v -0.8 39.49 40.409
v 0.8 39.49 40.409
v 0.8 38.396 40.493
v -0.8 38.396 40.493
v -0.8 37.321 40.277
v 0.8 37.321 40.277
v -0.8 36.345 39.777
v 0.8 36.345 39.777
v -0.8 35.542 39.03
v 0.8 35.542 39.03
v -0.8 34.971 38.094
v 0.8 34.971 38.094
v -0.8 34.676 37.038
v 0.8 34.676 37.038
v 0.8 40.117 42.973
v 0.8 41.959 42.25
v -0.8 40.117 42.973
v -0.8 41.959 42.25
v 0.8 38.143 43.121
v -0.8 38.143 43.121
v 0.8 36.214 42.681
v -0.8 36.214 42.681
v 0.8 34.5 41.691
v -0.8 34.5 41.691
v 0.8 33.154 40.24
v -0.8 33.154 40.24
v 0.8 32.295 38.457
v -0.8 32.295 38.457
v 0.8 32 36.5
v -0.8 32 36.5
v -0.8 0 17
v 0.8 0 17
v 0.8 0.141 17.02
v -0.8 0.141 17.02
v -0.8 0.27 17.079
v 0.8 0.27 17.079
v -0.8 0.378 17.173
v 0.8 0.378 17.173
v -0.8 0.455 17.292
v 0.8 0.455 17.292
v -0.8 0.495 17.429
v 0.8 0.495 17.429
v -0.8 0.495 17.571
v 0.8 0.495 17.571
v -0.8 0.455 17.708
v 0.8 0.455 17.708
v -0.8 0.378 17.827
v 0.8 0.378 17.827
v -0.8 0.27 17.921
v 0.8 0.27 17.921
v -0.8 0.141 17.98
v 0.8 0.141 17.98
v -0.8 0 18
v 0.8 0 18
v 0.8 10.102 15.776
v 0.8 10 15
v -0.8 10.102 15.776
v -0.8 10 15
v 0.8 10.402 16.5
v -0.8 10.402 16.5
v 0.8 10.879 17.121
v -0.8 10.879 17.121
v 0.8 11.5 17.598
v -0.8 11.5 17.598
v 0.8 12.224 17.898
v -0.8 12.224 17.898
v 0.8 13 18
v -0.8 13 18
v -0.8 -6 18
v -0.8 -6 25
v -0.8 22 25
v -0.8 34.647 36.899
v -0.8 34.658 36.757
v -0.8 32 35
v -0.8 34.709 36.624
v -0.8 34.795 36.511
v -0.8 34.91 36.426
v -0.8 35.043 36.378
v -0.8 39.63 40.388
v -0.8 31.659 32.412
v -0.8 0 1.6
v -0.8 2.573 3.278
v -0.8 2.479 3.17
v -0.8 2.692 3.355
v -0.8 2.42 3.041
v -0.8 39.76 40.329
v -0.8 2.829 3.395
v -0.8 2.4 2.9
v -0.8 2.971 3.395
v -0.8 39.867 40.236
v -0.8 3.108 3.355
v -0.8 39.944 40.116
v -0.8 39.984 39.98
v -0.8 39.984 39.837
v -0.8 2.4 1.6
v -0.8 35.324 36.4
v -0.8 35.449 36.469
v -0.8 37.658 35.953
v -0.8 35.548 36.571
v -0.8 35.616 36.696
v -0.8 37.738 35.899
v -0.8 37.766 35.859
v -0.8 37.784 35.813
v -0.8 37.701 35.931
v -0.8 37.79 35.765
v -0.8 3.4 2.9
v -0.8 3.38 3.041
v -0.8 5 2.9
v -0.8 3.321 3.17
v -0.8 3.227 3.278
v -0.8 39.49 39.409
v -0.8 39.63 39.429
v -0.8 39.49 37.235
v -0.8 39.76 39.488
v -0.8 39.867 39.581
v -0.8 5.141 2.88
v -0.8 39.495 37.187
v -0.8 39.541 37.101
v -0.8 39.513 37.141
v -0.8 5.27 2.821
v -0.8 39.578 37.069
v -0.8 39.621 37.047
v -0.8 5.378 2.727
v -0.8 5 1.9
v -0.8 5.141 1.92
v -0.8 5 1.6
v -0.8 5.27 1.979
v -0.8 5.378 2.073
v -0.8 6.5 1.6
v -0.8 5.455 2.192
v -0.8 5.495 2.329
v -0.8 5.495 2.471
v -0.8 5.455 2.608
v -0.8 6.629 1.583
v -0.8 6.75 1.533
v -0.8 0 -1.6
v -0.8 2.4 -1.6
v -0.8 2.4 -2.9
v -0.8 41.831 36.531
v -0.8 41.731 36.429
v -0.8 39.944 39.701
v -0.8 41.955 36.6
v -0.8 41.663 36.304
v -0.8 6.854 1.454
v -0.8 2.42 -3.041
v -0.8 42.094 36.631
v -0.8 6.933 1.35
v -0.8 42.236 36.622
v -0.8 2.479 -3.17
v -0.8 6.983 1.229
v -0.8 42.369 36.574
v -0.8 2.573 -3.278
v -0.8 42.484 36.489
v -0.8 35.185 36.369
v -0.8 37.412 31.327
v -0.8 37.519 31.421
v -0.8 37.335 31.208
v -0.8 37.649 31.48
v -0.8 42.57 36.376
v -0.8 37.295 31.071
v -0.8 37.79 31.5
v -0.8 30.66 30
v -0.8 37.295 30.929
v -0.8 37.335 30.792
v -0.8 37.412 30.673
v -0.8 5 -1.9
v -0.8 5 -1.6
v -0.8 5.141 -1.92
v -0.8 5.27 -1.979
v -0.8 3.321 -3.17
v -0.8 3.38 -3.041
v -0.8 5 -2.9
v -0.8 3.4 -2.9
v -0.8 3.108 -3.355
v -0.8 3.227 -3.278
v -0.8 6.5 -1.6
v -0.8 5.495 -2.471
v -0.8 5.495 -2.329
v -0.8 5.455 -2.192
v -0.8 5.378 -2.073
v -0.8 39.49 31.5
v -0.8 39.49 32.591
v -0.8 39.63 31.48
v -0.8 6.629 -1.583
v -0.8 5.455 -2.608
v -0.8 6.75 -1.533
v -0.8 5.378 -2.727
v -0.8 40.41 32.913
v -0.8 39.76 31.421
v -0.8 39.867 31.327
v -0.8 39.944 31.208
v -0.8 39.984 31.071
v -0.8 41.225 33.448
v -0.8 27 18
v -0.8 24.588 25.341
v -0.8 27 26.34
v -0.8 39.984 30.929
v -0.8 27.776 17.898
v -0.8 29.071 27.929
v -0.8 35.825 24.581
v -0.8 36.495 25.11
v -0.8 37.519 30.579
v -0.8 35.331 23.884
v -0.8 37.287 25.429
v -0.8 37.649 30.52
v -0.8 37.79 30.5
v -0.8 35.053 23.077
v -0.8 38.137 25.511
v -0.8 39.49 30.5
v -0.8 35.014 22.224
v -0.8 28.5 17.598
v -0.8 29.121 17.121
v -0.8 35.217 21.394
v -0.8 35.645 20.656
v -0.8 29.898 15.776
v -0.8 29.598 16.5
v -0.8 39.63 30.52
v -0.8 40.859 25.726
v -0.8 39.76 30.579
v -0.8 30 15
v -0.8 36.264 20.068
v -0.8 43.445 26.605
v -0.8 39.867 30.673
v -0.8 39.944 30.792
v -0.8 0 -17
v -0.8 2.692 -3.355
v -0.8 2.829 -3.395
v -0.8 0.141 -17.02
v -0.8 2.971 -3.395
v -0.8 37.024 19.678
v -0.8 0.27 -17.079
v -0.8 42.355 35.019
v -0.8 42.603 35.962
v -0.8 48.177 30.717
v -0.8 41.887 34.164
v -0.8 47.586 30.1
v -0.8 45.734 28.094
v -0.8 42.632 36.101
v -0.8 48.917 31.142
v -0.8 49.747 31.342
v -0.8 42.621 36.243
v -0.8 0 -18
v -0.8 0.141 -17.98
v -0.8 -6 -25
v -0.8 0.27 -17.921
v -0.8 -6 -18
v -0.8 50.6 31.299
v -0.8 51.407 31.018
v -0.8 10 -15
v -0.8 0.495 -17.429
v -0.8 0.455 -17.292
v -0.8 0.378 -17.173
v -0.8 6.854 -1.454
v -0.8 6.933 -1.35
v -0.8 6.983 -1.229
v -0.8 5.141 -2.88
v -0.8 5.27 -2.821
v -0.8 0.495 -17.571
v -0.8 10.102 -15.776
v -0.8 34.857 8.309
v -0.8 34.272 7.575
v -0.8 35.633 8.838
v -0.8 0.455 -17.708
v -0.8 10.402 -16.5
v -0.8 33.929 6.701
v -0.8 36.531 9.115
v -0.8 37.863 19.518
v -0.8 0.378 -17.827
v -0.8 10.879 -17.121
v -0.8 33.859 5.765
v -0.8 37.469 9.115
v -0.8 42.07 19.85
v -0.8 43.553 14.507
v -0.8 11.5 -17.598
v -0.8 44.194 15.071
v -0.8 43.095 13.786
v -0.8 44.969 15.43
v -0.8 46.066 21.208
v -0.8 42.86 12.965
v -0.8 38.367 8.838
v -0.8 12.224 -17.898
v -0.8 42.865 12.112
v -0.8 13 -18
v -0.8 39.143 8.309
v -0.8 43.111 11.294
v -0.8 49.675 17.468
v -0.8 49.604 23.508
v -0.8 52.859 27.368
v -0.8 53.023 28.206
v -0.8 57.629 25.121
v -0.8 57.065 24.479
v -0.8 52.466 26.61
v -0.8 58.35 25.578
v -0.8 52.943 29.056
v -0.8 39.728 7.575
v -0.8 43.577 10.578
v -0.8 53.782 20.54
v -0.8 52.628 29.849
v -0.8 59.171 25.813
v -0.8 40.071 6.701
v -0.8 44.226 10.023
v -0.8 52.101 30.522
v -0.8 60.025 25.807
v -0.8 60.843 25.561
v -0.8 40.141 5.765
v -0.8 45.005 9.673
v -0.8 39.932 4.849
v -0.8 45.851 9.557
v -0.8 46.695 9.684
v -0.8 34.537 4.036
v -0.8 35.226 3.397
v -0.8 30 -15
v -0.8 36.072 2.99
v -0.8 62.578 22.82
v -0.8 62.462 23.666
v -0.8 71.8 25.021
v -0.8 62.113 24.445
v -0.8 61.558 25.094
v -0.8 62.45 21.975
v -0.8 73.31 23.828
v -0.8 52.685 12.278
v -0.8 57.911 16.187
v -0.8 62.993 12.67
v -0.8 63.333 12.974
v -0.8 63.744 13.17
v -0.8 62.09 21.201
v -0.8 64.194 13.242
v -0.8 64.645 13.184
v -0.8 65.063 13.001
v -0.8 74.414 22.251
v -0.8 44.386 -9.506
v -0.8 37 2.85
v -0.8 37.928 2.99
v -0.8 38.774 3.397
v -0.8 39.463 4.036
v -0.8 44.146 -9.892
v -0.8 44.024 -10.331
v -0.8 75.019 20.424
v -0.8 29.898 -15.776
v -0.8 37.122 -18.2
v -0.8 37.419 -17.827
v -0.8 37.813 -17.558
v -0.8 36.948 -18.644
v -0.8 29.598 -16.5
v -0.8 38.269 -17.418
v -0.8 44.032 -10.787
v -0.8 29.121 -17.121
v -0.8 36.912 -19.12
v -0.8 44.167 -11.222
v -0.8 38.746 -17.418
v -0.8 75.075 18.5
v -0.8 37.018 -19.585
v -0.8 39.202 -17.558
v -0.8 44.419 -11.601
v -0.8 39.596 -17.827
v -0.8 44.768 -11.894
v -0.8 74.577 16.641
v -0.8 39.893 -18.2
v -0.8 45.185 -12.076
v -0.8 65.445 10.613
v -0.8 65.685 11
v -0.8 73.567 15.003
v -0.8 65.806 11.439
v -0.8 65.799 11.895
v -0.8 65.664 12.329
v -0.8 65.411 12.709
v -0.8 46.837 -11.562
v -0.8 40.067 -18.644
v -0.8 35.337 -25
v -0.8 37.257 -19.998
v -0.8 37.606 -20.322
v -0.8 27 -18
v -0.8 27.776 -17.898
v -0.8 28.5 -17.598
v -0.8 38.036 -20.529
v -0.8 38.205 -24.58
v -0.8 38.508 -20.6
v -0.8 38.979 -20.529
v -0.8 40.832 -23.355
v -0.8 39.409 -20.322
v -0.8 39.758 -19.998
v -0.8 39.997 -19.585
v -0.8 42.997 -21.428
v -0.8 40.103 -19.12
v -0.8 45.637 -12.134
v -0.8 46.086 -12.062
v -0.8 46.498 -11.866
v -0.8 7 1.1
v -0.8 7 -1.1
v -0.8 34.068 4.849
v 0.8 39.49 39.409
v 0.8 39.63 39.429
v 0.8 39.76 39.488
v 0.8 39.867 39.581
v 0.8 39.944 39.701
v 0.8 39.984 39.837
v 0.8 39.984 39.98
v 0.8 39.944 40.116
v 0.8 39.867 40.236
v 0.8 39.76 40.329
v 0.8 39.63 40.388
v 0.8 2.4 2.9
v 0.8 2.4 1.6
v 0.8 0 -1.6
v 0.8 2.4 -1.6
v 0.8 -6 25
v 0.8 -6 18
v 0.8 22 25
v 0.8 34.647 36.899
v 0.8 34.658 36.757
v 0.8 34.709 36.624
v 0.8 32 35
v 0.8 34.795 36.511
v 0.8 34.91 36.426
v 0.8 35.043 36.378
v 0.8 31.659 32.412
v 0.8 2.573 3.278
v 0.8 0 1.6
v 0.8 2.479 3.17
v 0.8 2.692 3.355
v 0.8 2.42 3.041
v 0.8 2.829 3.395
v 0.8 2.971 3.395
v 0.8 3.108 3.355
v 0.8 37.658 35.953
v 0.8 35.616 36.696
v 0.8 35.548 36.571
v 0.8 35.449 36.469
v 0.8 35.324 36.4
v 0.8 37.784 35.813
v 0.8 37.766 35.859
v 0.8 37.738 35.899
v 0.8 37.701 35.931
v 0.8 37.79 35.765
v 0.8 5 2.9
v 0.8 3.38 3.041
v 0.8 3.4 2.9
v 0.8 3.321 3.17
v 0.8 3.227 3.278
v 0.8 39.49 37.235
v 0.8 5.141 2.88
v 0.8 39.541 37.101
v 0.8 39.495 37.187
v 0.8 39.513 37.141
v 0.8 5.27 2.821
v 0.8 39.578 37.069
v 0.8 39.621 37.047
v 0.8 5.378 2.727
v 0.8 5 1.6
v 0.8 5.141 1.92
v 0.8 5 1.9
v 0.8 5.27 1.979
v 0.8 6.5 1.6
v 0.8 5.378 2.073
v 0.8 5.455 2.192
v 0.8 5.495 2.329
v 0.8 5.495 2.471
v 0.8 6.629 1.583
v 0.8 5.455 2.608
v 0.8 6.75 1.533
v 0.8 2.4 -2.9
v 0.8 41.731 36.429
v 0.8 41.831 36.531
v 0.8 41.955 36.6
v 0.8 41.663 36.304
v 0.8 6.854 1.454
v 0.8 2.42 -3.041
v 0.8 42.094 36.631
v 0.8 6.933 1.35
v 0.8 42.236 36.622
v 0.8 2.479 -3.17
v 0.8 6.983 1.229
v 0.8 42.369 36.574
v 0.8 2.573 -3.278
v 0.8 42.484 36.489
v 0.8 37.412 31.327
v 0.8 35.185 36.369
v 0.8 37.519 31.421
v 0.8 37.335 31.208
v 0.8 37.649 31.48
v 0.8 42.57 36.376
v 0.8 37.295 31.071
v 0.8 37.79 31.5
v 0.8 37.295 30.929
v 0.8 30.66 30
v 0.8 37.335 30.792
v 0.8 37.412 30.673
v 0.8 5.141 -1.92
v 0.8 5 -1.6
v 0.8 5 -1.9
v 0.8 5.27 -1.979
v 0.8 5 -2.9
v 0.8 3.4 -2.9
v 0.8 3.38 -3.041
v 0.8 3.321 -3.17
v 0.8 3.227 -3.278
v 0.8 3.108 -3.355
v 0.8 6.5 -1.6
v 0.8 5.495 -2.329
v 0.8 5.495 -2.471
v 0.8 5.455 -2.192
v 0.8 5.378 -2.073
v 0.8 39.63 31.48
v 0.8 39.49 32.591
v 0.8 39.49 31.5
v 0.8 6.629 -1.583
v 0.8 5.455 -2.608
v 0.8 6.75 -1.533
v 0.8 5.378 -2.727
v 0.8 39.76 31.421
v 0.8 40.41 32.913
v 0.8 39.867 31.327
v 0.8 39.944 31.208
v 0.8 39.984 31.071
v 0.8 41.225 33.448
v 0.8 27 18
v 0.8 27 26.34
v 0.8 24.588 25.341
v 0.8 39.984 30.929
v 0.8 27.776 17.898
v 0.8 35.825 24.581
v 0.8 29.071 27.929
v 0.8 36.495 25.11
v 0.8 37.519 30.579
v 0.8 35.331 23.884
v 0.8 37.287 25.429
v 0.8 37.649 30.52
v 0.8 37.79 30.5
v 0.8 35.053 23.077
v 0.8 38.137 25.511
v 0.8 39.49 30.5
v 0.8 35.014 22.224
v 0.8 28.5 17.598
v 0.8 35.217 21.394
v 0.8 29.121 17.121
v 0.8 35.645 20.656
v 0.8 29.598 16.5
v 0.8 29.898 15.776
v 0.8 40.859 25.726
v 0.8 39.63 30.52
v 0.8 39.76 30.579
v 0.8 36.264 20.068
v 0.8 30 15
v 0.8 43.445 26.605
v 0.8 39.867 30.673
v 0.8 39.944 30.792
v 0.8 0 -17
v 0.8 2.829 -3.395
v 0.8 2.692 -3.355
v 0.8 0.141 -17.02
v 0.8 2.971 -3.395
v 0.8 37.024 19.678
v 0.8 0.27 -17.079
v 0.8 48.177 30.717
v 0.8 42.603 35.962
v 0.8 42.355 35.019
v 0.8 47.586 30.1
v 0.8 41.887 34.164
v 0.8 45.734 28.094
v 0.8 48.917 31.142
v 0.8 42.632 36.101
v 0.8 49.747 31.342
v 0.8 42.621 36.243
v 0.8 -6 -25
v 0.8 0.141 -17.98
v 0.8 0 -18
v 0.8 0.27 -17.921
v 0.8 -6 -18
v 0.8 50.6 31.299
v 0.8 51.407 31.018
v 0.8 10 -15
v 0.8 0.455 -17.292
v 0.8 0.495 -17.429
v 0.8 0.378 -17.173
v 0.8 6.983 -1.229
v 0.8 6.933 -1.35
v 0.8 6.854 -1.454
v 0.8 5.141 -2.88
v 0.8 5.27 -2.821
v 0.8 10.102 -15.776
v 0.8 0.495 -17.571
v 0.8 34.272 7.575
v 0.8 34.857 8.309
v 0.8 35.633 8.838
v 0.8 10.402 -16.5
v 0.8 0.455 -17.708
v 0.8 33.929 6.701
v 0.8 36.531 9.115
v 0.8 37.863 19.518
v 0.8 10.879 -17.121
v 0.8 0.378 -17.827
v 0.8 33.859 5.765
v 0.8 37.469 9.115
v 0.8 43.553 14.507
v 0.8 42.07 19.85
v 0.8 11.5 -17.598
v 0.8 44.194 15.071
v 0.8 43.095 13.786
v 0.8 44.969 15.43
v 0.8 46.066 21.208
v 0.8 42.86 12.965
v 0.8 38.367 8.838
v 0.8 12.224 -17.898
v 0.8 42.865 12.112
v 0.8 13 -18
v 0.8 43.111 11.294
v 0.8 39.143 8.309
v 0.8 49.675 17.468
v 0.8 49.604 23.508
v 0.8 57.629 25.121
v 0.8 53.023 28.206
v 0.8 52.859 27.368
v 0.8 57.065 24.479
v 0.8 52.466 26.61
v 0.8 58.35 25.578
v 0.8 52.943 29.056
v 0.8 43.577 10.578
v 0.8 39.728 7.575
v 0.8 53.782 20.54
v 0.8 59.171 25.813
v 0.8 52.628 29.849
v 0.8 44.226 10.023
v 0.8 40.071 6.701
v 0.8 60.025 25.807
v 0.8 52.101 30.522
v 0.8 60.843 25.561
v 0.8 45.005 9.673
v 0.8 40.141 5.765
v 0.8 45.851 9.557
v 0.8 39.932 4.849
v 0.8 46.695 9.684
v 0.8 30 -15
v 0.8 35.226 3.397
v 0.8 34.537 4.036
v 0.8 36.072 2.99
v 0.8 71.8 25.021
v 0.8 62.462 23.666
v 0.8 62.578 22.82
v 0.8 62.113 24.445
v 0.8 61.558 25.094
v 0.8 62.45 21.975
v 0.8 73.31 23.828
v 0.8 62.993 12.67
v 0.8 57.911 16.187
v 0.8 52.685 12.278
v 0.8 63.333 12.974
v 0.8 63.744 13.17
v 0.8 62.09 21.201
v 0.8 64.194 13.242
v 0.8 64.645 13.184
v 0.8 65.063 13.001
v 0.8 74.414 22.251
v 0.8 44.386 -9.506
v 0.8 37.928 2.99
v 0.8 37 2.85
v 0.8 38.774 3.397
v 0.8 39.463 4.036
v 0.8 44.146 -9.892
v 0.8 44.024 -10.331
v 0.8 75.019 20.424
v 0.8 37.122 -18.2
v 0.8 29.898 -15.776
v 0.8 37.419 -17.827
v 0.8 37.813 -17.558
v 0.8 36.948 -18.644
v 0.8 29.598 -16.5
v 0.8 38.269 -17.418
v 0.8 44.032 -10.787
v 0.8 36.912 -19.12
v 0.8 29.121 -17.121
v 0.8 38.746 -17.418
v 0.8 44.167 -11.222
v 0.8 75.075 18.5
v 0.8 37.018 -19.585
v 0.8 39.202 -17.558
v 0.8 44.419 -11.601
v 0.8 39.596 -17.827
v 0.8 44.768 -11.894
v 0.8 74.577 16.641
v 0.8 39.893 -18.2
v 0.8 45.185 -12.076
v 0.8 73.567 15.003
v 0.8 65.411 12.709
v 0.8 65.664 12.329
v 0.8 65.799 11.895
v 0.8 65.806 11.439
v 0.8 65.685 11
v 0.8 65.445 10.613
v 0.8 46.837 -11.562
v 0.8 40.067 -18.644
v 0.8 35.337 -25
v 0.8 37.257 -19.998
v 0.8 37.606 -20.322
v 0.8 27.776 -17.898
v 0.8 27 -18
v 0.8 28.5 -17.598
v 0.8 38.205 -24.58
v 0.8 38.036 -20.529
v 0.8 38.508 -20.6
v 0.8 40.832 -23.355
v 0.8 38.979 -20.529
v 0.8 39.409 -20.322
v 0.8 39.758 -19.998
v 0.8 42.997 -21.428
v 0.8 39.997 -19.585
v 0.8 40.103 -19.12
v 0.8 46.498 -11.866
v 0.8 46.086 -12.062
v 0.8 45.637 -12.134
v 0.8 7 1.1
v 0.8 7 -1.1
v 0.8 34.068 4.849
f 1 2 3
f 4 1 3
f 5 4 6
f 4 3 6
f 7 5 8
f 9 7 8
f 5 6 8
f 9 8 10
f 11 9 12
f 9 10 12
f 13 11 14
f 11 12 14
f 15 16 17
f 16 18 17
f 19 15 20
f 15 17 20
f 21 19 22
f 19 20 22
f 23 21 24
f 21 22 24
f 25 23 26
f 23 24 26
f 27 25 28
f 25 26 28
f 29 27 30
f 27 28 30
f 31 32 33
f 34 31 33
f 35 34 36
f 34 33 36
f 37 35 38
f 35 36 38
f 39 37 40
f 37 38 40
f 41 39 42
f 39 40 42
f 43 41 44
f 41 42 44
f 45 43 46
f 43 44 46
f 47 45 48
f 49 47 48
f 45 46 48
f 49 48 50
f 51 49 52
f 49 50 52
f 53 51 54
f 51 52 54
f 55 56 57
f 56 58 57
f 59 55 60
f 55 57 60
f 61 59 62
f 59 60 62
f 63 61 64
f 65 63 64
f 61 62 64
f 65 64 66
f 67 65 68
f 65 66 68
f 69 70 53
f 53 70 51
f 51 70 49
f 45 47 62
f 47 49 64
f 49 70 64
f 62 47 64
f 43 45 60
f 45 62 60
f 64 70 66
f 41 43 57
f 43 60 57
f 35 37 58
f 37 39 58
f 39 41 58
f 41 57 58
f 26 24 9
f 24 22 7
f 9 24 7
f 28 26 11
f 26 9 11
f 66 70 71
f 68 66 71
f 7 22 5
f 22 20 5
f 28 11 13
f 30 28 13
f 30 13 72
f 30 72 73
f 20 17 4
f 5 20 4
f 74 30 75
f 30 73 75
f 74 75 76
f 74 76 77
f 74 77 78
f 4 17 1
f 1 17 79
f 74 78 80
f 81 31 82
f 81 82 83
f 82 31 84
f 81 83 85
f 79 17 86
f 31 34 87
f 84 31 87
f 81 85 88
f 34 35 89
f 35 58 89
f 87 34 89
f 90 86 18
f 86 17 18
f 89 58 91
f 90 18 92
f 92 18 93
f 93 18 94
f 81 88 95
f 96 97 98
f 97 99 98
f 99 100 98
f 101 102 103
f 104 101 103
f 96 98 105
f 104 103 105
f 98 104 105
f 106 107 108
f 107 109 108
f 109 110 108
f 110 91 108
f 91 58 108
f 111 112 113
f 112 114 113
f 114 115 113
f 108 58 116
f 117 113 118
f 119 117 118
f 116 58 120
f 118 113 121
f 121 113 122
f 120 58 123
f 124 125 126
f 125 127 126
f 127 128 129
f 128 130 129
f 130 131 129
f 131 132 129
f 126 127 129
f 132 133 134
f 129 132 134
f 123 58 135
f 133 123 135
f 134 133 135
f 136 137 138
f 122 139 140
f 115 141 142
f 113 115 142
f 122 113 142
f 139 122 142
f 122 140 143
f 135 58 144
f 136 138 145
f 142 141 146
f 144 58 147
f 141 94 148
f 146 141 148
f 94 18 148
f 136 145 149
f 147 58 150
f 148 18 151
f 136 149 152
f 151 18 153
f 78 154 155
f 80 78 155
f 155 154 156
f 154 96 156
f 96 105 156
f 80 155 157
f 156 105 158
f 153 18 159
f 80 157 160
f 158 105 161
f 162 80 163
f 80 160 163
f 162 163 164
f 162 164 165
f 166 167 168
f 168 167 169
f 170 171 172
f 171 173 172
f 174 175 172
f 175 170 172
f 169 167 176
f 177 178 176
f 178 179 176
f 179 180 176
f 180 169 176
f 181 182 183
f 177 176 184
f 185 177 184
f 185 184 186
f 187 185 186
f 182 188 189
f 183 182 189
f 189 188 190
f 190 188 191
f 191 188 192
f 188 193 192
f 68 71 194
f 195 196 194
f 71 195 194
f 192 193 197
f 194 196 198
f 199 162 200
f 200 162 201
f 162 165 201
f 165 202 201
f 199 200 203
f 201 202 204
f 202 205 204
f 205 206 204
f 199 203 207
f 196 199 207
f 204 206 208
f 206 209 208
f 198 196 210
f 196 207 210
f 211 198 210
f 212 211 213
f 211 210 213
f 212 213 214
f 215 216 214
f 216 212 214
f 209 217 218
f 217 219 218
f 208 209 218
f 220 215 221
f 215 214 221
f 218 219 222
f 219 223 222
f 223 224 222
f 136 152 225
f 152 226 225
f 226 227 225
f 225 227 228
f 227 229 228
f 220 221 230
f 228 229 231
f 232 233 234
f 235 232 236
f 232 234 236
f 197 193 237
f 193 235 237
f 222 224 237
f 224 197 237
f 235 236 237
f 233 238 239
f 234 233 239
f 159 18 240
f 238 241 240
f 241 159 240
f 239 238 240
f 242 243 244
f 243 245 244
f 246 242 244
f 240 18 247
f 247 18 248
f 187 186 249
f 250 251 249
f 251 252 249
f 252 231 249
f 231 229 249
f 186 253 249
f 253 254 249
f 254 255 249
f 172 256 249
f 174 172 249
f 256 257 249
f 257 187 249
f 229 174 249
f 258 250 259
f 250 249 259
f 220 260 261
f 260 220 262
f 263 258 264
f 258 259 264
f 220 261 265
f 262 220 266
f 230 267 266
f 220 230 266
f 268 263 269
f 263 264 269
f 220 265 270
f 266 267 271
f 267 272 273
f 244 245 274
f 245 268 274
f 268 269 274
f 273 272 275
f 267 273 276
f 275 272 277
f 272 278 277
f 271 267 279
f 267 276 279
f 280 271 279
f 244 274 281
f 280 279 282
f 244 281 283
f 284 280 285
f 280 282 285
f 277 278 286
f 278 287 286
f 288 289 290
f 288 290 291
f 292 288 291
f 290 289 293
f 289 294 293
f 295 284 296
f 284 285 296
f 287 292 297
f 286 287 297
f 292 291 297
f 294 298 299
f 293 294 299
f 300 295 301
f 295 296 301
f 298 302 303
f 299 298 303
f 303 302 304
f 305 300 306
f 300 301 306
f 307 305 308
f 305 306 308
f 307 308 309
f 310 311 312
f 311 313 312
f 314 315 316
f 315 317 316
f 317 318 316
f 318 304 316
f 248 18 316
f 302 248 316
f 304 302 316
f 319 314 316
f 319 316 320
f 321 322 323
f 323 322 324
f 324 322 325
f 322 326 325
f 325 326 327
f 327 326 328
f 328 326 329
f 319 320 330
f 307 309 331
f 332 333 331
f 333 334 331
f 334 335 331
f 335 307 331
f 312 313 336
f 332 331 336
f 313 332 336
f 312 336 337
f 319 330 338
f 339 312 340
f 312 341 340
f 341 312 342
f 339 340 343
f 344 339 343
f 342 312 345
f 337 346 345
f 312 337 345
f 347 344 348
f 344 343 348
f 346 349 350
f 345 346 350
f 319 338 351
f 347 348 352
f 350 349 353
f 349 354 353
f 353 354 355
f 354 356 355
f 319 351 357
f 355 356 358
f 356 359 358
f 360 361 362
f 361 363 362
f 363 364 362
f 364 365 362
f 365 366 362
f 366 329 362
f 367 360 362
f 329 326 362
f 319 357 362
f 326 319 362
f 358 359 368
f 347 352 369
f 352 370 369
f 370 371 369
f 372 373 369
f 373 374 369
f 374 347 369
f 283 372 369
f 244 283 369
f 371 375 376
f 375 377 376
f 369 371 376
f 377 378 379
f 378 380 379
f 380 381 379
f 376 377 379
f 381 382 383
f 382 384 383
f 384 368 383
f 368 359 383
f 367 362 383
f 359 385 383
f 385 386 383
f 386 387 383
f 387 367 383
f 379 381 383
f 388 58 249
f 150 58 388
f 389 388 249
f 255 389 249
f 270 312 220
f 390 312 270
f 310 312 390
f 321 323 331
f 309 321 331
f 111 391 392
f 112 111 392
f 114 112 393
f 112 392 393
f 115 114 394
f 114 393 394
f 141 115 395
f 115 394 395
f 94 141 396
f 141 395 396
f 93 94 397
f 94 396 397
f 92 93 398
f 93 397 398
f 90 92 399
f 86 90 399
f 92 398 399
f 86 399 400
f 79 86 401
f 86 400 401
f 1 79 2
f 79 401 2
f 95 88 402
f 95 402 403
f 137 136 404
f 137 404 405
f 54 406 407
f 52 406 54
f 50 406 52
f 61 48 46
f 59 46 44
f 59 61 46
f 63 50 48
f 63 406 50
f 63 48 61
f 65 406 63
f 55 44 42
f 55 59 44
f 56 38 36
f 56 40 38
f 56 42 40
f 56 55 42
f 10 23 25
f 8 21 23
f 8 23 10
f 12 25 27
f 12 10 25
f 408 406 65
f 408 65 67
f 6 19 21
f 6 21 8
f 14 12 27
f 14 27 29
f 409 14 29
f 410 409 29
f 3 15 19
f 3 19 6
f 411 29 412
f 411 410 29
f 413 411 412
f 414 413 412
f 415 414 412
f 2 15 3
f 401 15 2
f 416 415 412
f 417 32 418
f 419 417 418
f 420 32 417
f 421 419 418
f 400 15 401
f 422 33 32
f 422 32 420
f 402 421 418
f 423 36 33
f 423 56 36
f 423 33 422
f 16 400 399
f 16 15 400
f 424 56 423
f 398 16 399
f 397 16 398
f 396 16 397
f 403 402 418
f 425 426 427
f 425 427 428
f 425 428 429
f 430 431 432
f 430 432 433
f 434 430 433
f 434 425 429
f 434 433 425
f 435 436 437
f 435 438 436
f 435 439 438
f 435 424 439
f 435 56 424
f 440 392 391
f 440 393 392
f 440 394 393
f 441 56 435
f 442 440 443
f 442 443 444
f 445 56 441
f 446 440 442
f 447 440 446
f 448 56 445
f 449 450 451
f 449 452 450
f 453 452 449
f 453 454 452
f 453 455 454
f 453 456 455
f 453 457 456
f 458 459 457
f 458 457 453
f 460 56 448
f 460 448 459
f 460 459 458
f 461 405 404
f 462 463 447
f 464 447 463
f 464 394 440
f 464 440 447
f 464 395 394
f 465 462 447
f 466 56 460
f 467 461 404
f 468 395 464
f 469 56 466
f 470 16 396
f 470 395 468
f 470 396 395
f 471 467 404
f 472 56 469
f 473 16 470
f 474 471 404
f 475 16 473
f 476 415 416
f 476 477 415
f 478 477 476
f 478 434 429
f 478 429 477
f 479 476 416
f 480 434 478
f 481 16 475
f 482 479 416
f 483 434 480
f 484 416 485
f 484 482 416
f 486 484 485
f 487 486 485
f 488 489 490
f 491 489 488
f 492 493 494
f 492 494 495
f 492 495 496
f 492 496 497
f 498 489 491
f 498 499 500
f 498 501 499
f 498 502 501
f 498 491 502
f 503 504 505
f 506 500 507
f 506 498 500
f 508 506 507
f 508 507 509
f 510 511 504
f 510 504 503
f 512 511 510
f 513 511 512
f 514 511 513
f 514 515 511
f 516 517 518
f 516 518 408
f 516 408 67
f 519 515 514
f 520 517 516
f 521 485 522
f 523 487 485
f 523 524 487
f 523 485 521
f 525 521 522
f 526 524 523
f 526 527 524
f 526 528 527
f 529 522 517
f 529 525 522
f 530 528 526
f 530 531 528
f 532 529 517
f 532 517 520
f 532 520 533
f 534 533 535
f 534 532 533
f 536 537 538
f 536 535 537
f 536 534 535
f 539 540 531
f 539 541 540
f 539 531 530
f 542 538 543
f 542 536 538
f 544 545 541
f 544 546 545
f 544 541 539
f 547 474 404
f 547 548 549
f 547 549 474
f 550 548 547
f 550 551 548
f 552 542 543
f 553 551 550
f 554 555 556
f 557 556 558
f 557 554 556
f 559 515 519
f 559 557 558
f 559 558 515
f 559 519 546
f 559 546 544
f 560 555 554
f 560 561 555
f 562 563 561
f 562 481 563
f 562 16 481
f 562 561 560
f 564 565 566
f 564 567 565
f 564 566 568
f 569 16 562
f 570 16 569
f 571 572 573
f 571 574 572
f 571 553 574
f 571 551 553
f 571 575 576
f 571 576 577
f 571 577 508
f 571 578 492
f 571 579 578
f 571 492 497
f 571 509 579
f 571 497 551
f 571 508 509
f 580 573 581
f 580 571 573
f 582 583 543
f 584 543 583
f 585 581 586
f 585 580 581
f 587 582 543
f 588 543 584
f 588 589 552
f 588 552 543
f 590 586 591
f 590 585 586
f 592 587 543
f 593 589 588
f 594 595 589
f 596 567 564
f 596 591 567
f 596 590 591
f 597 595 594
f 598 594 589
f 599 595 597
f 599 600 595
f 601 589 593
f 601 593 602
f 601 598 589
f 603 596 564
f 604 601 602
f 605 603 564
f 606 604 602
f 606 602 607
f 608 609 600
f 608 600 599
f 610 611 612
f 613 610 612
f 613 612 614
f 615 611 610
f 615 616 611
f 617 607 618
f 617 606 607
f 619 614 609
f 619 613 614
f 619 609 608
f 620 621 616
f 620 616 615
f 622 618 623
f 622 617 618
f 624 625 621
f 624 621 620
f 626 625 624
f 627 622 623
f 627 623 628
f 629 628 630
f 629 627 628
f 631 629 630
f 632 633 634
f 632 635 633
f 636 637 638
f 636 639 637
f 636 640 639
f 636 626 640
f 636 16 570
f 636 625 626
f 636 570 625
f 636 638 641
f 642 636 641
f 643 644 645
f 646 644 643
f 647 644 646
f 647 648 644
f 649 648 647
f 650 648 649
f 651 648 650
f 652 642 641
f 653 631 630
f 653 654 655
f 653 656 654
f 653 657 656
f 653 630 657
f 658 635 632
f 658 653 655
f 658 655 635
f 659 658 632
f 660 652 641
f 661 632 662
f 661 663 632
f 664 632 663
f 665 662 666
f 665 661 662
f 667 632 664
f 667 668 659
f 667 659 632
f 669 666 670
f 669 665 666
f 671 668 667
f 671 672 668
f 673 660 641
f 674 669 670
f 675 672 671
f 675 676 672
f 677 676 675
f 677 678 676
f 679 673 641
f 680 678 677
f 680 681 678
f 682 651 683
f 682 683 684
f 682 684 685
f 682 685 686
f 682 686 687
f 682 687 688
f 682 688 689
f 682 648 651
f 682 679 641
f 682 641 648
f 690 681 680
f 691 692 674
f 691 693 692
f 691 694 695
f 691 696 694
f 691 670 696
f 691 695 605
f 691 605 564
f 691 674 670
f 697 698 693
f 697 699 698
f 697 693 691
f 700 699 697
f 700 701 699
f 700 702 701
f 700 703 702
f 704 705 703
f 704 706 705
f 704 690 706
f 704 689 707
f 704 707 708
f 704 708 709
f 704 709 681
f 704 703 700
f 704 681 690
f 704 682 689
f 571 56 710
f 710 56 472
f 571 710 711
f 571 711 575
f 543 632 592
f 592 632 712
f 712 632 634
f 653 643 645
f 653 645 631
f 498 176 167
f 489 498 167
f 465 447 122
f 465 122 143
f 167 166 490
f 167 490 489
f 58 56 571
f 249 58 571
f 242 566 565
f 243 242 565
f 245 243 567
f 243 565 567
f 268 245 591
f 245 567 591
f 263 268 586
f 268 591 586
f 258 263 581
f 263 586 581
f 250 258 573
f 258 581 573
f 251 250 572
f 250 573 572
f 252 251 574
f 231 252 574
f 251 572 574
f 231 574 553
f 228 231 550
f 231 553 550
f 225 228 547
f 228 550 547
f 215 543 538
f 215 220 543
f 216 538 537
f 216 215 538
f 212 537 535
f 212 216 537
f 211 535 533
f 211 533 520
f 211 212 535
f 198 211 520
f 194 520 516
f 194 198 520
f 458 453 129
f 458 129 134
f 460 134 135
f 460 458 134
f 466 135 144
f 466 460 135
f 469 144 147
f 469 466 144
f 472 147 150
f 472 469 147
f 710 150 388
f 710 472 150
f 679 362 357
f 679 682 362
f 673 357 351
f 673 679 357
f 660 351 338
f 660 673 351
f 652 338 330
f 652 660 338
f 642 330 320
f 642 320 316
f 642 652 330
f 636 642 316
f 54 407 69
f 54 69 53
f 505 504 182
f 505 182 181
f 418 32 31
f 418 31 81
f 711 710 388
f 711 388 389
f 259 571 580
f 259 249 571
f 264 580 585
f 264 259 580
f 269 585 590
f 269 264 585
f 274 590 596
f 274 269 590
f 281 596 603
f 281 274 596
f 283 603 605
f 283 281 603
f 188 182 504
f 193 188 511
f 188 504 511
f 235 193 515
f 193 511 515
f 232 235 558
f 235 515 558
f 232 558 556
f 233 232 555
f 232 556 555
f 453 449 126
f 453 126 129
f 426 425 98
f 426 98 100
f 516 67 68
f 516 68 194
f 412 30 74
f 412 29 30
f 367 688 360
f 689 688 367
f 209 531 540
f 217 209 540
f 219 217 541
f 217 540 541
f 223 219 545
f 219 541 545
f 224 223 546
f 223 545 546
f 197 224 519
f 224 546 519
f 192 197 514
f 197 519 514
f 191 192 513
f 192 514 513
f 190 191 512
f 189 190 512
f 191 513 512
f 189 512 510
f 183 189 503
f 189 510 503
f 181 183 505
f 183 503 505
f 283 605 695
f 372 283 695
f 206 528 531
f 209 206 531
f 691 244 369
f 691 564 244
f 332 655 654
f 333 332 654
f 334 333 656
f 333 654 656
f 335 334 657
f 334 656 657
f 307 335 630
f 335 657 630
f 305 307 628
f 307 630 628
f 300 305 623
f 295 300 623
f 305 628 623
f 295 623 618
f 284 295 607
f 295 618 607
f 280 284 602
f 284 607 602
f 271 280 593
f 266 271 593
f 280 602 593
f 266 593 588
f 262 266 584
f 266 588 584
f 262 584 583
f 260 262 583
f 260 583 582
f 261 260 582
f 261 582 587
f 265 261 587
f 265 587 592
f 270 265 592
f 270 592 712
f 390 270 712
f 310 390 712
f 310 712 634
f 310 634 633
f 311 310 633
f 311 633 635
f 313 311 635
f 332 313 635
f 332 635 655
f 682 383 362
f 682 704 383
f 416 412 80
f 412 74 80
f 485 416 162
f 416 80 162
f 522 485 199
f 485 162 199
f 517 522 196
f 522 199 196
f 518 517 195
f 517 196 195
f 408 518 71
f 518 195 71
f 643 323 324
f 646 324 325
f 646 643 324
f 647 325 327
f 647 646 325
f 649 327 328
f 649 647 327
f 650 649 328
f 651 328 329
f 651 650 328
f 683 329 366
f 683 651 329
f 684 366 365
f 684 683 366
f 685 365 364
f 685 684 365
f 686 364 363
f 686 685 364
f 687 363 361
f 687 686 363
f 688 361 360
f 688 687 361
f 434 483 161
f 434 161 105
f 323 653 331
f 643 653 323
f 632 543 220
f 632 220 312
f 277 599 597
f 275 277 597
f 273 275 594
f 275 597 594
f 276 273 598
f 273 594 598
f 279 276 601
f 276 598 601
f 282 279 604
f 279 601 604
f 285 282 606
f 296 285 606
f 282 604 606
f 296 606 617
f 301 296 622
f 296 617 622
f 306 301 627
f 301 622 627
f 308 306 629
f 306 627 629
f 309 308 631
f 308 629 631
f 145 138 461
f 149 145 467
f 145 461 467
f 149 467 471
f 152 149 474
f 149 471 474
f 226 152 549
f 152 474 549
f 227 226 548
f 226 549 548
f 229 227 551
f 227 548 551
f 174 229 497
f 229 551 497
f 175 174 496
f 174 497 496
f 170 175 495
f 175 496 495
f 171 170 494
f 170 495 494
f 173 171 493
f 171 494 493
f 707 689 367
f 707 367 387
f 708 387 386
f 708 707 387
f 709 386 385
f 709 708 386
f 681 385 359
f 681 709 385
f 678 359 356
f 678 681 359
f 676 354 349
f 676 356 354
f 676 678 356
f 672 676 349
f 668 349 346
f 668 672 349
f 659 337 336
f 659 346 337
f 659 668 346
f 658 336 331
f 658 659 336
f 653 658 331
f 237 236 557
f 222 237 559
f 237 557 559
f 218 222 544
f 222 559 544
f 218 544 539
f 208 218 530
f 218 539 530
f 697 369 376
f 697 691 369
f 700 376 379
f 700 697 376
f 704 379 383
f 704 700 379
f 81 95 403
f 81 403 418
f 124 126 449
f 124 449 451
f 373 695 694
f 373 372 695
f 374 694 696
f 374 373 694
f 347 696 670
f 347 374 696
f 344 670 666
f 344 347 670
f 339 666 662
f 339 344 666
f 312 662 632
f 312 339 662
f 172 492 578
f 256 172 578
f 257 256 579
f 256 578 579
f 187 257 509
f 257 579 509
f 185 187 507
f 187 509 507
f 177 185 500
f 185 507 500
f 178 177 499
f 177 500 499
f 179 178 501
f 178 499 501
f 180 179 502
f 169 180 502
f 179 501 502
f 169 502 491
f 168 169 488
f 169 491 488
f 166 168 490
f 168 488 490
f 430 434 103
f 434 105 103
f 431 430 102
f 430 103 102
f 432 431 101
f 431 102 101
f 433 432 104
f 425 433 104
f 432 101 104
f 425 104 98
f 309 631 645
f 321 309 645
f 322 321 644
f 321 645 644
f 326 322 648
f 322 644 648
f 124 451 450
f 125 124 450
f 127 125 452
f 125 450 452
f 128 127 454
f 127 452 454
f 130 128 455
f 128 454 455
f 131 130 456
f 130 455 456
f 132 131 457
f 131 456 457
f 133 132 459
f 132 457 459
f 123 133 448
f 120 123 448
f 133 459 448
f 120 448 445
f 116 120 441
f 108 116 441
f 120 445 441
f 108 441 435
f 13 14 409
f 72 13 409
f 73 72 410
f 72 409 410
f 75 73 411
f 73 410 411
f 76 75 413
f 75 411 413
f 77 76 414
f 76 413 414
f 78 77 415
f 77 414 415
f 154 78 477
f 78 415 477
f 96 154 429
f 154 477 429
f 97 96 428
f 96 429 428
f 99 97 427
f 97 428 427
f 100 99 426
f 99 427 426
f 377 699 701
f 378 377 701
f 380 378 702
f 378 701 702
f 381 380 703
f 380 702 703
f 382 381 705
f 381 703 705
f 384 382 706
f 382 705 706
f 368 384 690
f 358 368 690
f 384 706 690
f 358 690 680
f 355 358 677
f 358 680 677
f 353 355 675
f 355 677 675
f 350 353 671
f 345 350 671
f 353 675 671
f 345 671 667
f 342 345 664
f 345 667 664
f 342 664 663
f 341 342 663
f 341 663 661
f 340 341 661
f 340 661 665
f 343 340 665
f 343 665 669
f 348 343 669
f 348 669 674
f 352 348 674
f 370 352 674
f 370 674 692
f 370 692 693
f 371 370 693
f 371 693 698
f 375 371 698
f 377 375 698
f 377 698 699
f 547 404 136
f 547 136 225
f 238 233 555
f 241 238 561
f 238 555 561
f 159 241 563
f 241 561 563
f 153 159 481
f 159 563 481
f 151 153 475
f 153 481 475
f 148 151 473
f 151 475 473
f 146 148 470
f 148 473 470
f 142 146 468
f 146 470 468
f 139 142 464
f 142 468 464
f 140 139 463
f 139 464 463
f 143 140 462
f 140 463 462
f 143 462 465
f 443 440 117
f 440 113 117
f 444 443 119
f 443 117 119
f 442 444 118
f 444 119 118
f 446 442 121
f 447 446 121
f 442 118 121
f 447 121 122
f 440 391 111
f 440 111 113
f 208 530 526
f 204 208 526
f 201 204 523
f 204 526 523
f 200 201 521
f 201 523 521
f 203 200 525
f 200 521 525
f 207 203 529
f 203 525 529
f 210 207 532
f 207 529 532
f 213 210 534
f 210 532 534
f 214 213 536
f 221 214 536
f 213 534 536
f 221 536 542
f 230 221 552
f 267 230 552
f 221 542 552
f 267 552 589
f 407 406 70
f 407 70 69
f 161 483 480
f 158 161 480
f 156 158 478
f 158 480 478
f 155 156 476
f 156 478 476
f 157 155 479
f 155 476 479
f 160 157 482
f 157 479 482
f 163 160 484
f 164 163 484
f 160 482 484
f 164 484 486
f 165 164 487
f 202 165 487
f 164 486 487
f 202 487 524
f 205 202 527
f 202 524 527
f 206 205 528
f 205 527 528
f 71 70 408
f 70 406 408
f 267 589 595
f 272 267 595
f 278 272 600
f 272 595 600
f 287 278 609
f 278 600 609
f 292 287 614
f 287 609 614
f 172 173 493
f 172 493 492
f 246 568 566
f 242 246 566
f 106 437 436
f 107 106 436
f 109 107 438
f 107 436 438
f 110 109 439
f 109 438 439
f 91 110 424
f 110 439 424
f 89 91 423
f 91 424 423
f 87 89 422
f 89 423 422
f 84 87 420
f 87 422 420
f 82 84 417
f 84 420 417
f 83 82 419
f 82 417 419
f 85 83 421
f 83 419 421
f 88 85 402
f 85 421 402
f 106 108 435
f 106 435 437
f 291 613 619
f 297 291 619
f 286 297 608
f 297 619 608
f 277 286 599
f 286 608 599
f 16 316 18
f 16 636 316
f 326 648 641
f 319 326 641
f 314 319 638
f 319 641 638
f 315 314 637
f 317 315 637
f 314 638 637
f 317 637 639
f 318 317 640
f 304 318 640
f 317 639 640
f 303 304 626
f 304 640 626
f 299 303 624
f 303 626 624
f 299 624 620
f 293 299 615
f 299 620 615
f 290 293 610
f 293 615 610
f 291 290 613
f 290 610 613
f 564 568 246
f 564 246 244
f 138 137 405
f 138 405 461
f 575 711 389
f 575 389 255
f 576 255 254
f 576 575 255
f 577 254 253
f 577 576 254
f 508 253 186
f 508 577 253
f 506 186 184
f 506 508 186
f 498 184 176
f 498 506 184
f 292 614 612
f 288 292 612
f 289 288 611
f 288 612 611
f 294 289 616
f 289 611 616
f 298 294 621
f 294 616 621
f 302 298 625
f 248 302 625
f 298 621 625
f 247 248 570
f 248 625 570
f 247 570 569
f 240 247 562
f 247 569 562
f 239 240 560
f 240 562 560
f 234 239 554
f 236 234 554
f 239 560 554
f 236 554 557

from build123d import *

# Parameters (mm, degrees)
MAIN_BODY_DEPTH                     = 0.8
SLOT_TABS_REACH                     = 94.146
SKETCH2_W                           = 7
SKETCH2_H                           = 6
SLOT_TABS_DIRECTION_2_REACH         = 94.146
ATTACHMENT_T_SLOT_DEPTH             = 93.146279065
ATTACHMENT_T_SLOT_DEPTH_BACK        = 93.146279065
SKETCH5_R                           = 1.6
CAMERA_SLOT_AND_STANDOFF_HOLE_DEPTH = 93.156696694
SKETCH6_R                           = 4
CAMERA_PLATE_HOLE_DEPTH             = 93.156696694
SKETCH9_W                           = 4
SKETCH9_H                           = 1.7
CAMERA_PLATE_SLOT_DEPTH             = 93.156696694
ANGLE_GUARD_DEPTH                   = 1.6
SKETCH7_W                           = 36
SKETCH7_H                           = 20
CUT_EXTRUDE4_DEPTH                  = 93.156696694
CAMERA_PLATE_HOLE_EASE_R            = 0.2
ACCESS_HOLE_FILLET_R                = 3
SECONDARY_FILLET_R                  = 10
CAMERA_EDGE_FILLET_R                = 6.639528096
SKETCH8_R                           = 3.15
TX_MOUNT_HOLE_DEPTH                 = 87.640768077
CUT_EXTRUDE5_REACH                  = 88.641
SKETCH14_R                          = 0.5
CUT_EXTRUDE6_REACH                  = 88.641


with BuildPart() as part:
    # Sketch1 → main body (new, symmetric)
    with BuildSketch(Plane(origin=(0, 0, 0), x_dir=(0, 0, -1), z_dir=(1, 0, 0))):
        Polygon((-25, 0), (25, 0), (25, 40), (-21.064869316, 78.653014853), (-48, 32), (-25, 32), align=None)
    extrude(amount=MAIN_BODY_DEPTH, both=True)

    # slot tabs: up to this face of the body (flat: up to its plane)
    slot_tabs_end = Plane(part.part.faces().sort_by_distance((0.8, 33.215216507, 6.663009482))[0])
    # Sketch2 → slot tabs (add, up to the picked face)
    with BuildSketch(Plane(origin=(0, 0, 0), x_dir=(0, 0, -1), z_dir=(1, 0, 0)), mode=Mode.PRIVATE) as slot_tabs_sk1:
        with Locations((-21.5, -3)):
            Rectangle(SKETCH2_W, SKETCH2_H)
    slot_tabs_tool1 = split(extrude(slot_tabs_sk1.sketch, amount=SLOT_TABS_REACH, mode=Mode.PRIVATE), bisect_by=slot_tabs_end, keep=Keep.BOTH, mode=Mode.PRIVATE)
    # Sketch2 → slot tabs (add, up to the picked face)
    with BuildSketch(Plane(origin=(0, 0, 0), x_dir=(0, 0, -1), z_dir=(1, 0, 0)), mode=Mode.PRIVATE) as slot_tabs_sk2:
        with Locations((21.5, -3)):
            Rectangle(SKETCH2_W, SKETCH2_H)
    slot_tabs_tool2 = split(extrude(slot_tabs_sk2.sketch, amount=SLOT_TABS_REACH, mode=Mode.PRIVATE), bisect_by=slot_tabs_end, keep=Keep.BOTH, mode=Mode.PRIVATE)
    add(slot_tabs_tool1.solids().sort_by(Axis((0, -3, 21.5), (1, 0, 0)))[0])
    add(slot_tabs_tool2.solids().sort_by(Axis((0, -3, -21.5), (1, 0, 0)))[0])

    # slot tabs direction 2: up to this face of the body (flat: up to its plane)
    slot_tabs_direction_2_end = Plane(part.part.faces().sort_by_distance((-0.8, 33.215216507, 6.663009482))[0])
    # Sketch2 → slot tabs direction 2 (add, up to the picked face)
    with BuildSketch(Plane(origin=(0, 0, 0), x_dir=(0, 0, -1), z_dir=(1, 0, 0)), mode=Mode.PRIVATE) as slot_tabs_direction_2_sk1:
        with Locations((-21.5, -3)):
            Rectangle(SKETCH2_W, SKETCH2_H)
    slot_tabs_direction_2_tool1 = split(extrude(slot_tabs_direction_2_sk1.sketch, amount=-SLOT_TABS_DIRECTION_2_REACH, mode=Mode.PRIVATE), bisect_by=slot_tabs_direction_2_end, keep=Keep.BOTH, mode=Mode.PRIVATE)
    # Sketch2 → slot tabs direction 2 (add, up to the picked face)
    with BuildSketch(Plane(origin=(0, 0, 0), x_dir=(0, 0, -1), z_dir=(1, 0, 0)), mode=Mode.PRIVATE) as slot_tabs_direction_2_sk2:
        with Locations((21.5, -3)):
            Rectangle(SKETCH2_W, SKETCH2_H)
    slot_tabs_direction_2_tool2 = split(extrude(slot_tabs_direction_2_sk2.sketch, amount=-SLOT_TABS_DIRECTION_2_REACH, mode=Mode.PRIVATE), bisect_by=slot_tabs_direction_2_end, keep=Keep.BOTH, mode=Mode.PRIVATE)
    add(slot_tabs_direction_2_tool1.solids().sort_by(Axis((0, -3, 21.5), (-1, 0, 0)))[0])
    add(slot_tabs_direction_2_tool2.solids().sort_by(Axis((0, -3, -21.5), (-1, 0, 0)))[0])

    # Sketch3 → attachment t-slot (cut, two sides: drawn at the far end of the back side and taken through both)
    with BuildSketch(Plane(origin=(0, 0, 0), x_dir=(0, 0, -1), z_dir=(1, 0, 0)).offset(-ATTACHMENT_T_SLOT_DEPTH_BACK)):
        Polygon((-1.6, 2.4), (-1.6, 0), (1.6, 0), (1.6, 2.4), (2.9, 2.4), (2.9, 5), (-2.9, 5), (-2.9, 2.4), align=None)
    extrude(amount=ATTACHMENT_T_SLOT_DEPTH + ATTACHMENT_T_SLOT_DEPTH_BACK, mode=Mode.SUBTRACT)

    # Sketch5 → camera slot and standoff hole (cut, through all)
    with BuildSketch(Plane(origin=(0.8, 0, 0), x_dir=(0, 0, -1), z_dir=(1, 0, 0))):
        with Locations((19, 38.50756134)):
            Circle(SKETCH5_R)
        with BuildLine():
            Line((-10.613317549, 65.444736837), (11.562427184, 46.83707761))
            ThreePointArc((11.562427184, 46.83707761), (11.759638118, 44.582946325), (9.505506833, 44.385735392))
            Line((9.505506833, 44.385735392), (-12.6702379, 62.993394619))
            ThreePointArc((-12.6702379, 62.993394619), (-12.867448834, 65.247525903), (-10.613317549, 65.444736837))
        make_face()
    extrude(amount=-CAMERA_SLOT_AND_STANDOFF_HOLE_DEPTH, mode=Mode.SUBTRACT)

    # Sketch6 → camera plate hole (cut, through all)
    with BuildSketch(Plane(origin=(0.8, 0, 0), x_dir=(0, 0, -1), z_dir=(1, 0, 0))):
        with Locations((-36.5, 38.639528096)):
            Circle(SKETCH6_R)
    extrude(amount=-CAMERA_PLATE_HOLE_DEPTH, mode=Mode.SUBTRACT)

    # Sketch9 → camera plate slot (cut, through all)
    with BuildSketch(Plane(origin=(0.8, 0, 0), x_dir=(0, 0, -1), z_dir=(1, 0, 0))):
        with Locations((-32.5, 38.639528096)):
            Rectangle(SKETCH9_W, SKETCH9_H)
    extrude(amount=-CAMERA_PLATE_SLOT_DEPTH, mode=Mode.SUBTRACT)

    # Sketch11 → angle guard (add)
    with BuildSketch(Plane(origin=(0.8, 0, 0), x_dir=(0, 0, -1), z_dir=(1, 0, 0))):
        with BuildLine():
            Line((-40.408644266, 39.489528096), (-37.095176407, 39.489528096))
            Line((-37.095176407, 39.489528096), (-35.961903656, 42.603169392))
            ThreePointArc((-35.961903656, 42.603169392), (-38.794305745, 41.916136273), (-40.408644266, 39.489528096))
        make_face()
        with BuildLine():
            ThreePointArc((-37.038096344, 34.6758868), (-34.205694255, 35.362919919), (-32.591355734, 37.789528096))
            Line((-32.591355734, 37.789528096), (-35.904823593, 37.789528096))
            Line((-35.904823593, 37.789528096), (-37.038096344, 34.6758868))
        make_face()
    extrude(amount=-ANGLE_GUARD_DEPTH)

    # Sketch7 → Cut-Extrude4 (cut, through all)
    with BuildSketch(Plane(origin=(0.8, 0, 0), x_dir=(0, 0, -1), z_dir=(1, 0, 0))):
        with Locations((0, 20)):
            Rectangle(SKETCH7_W, SKETCH7_H)
    extrude(amount=-CUT_EXTRUDE4_DEPTH, mode=Mode.SUBTRACT)

    # camera plate hole ease
    camera_plate_hole_ease_edges = [part.edges().sort_by_distance(p)[0] for p in [
        (0, 39.489528096, 37.095176407),
        (0, 37.789528096, 35.904823593),
    ]]
    fillet(camera_plate_hole_ease_edges, radius=CAMERA_PLATE_HOLE_EASE_R)

    # access hole fillet
    access_hole_fillet_edges = [part.edges().sort_by_distance(p)[0] for p in [
        (0, 10, 18),
        (0, 30, 18),
        (0, 30, -18),
        (0, 10, -18),
    ]]
    fillet(access_hole_fillet_edges, radius=ACCESS_HOLE_FILLET_R)

    # secondary fillet
    secondary_fillet_edges = [part.edges().sort_by_distance(p)[0] for p in [
        (0, 32, 25),
        (0, 40, -25),
    ]]
    fillet(secondary_fillet_edges, radius=SECONDARY_FILLET_R)

    # camera edge fillet
    camera_edge_fillet_edges = [part.edges().sort_by_distance(p)[0] for p in [
        (0, 32, 48),
        (0, 78.653014853, 21.064869316),
    ]]
    fillet(camera_edge_fillet_edges, radius=CAMERA_EDGE_FILLET_R)

    # Sketch8 → TX mount hole (cut, through all)
    with BuildSketch(Plane(origin=(0.8, 0, 0), x_dir=(0, 0, -1), z_dir=(1, 0, 0))):
        with Locations((-6, 37)):
            Circle(SKETCH8_R)
    extrude(amount=-TX_MOUNT_HOLE_DEPTH, mode=Mode.SUBTRACT)

    # Sketch14 → Cut-Extrude5 (cut, up to next)
    with BuildSketch(Plane(origin=(0.8, 0, 0), x_dir=(0, 0, -1), z_dir=(1, 0, 0)), mode=Mode.PRIVATE) as cut_extrude5_sk1:
        with Locations((-2.4, 5)):
            Circle(SKETCH14_R)
    cut_extrude5_tool1 = extrude(cut_extrude5_sk1.sketch, amount=-CUT_EXTRUDE5_REACH, mode=Mode.PRIVATE) & part.part
    # Sketch14 → Cut-Extrude5 (cut, up to next)
    with BuildSketch(Plane(origin=(0.8, 0, 0), x_dir=(0, 0, -1), z_dir=(1, 0, 0)), mode=Mode.PRIVATE) as cut_extrude5_sk2:
        with Locations((2.4, 5)):
            Circle(SKETCH14_R)
    cut_extrude5_tool2 = extrude(cut_extrude5_sk2.sketch, amount=-CUT_EXTRUDE5_REACH, mode=Mode.PRIVATE) & part.part
    # Sketch14 → Cut-Extrude5 (cut, up to next)
    with BuildSketch(Plane(origin=(0.8, 0, 0), x_dir=(0, 0, -1), z_dir=(1, 0, 0)), mode=Mode.PRIVATE) as cut_extrude5_sk3:
        with Locations((2.9, 2.9)):
            Circle(SKETCH14_R)
    cut_extrude5_tool3 = extrude(cut_extrude5_sk3.sketch, amount=-CUT_EXTRUDE5_REACH, mode=Mode.PRIVATE) & part.part
    # Sketch14 → Cut-Extrude5 (cut, up to next)
    with BuildSketch(Plane(origin=(0.8, 0, 0), x_dir=(0, 0, -1), z_dir=(1, 0, 0)), mode=Mode.PRIVATE) as cut_extrude5_sk4:
        with Locations((-2.9, 2.9)):
            Circle(SKETCH14_R)
    cut_extrude5_tool4 = extrude(cut_extrude5_sk4.sketch, amount=-CUT_EXTRUDE5_REACH, mode=Mode.PRIVATE) & part.part
    # Sketch14 → Cut-Extrude5 (cut, up to next)
    with BuildSketch(Plane(origin=(0.8, 0, 0), x_dir=(0, 0, -1), z_dir=(1, 0, 0)), mode=Mode.PRIVATE) as cut_extrude5_sk5:
        with Locations((-17.5, 0)):
            Circle(SKETCH14_R)
    cut_extrude5_tool5 = extrude(cut_extrude5_sk5.sketch, amount=-CUT_EXTRUDE5_REACH, mode=Mode.PRIVATE) & part.part
    # Sketch14 → Cut-Extrude5 (cut, up to next)
    with BuildSketch(Plane(origin=(0.8, 0, 0), x_dir=(0, 0, -1), z_dir=(1, 0, 0)), mode=Mode.PRIVATE) as cut_extrude5_sk6:
        with Locations((17.5, 0)):
            Circle(SKETCH14_R)
    cut_extrude5_tool6 = extrude(cut_extrude5_sk6.sketch, amount=-CUT_EXTRUDE5_REACH, mode=Mode.PRIVATE) & part.part
    # Sketch14 → Cut-Extrude5 (cut, up to next)
    with BuildSketch(Plane(origin=(0.8, 0, 0), x_dir=(0, 0, -1), z_dir=(1, 0, 0)), mode=Mode.PRIVATE) as cut_extrude5_sk7:
        with Locations((-36.132913727, 42.133323081)):
            Circle(SKETCH14_R)
    cut_extrude5_tool7 = extrude(cut_extrude5_sk7.sketch, amount=-CUT_EXTRUDE5_REACH, mode=Mode.PRIVATE) & part.part
    # Sketch14 → Cut-Extrude5 (cut, up to next)
    with BuildSketch(Plane(origin=(0.8, 0, 0), x_dir=(0, 0, -1), z_dir=(1, 0, 0)), mode=Mode.PRIVATE) as cut_extrude5_sk8:
        with Locations((-39.908644266, 39.489528096)):
            Circle(SKETCH14_R)
    cut_extrude5_tool8 = extrude(cut_extrude5_sk8.sketch, amount=-CUT_EXTRUDE5_REACH, mode=Mode.PRIVATE) & part.part
    # Sketch14 → Cut-Extrude5 (cut, up to next)
    with BuildSketch(Plane(origin=(0.8, 0, 0), x_dir=(0, 0, -1), z_dir=(1, 0, 0)), mode=Mode.PRIVATE) as cut_extrude5_sk9:
        with Locations((-36.867086273, 35.14573311)):
            Circle(SKETCH14_R)
    cut_extrude5_tool9 = extrude(cut_extrude5_sk9.sketch, amount=-CUT_EXTRUDE5_REACH, mode=Mode.PRIVATE) & part.part
    # Sketch14 → Cut-Extrude5 (cut, up to next)
    with BuildSketch(Plane(origin=(0.8, 0, 0), x_dir=(0, 0, -1), z_dir=(1, 0, 0)), mode=Mode.PRIVATE) as cut_extrude5_sk10:
        with Locations((-31, 37.789528096)):
            Circle(SKETCH14_R)
    cut_extrude5_tool10 = extrude(cut_extrude5_sk10.sketch, amount=-CUT_EXTRUDE5_REACH, mode=Mode.PRIVATE) & part.part
    # Sketch14 → Cut-Extrude5 (cut, up to next)
    with BuildSketch(Plane(origin=(0.8, 0, 0), x_dir=(0, 0, -1), z_dir=(1, 0, 0)), mode=Mode.PRIVATE) as cut_extrude5_sk11:
        with Locations((-31, 39.489528096)):
            Circle(SKETCH14_R)
    cut_extrude5_tool11 = extrude(cut_extrude5_sk11.sketch, amount=-CUT_EXTRUDE5_REACH, mode=Mode.PRIVATE) & part.part
    # Sketch14 → Cut-Extrude5 (cut, up to next)
    with BuildSketch(Plane(origin=(0.8, 0, 0), x_dir=(0, 0, -1), z_dir=(1, 0, 0)), mode=Mode.PRIVATE) as cut_extrude5_sk12:
        with BuildLine():
            Line((-1.1, 7), (1.1, 7))
            ThreePointArc((1.1, 7), (1.453553391, 6.853553391), (1.6, 6.5))
            Line((1.6, 6.5), (1.6, 5))
            ThreePointArc((1.6, 5), (0, 3.4), (-1.6, 5))
            Line((-1.6, 5), (-1.6, 6.5))
            ThreePointArc((-1.6, 6.5), (-1.453553391, 6.853553391), (-1.1, 7))
        make_face()
    cut_extrude5_tool12 = extrude(cut_extrude5_sk12.sketch, amount=-CUT_EXTRUDE5_REACH, mode=Mode.PRIVATE) & part.part
    add(cut_extrude5_tool1.solids().sort_by_distance((0.8, 5, 2.4))[0], mode=Mode.SUBTRACT)
    add(cut_extrude5_tool2.solids().sort_by_distance((0.8, 5, -2.4))[0], mode=Mode.SUBTRACT)
    add(cut_extrude5_tool3.solids().sort_by_distance((0.8, 2.9, -2.9))[0], mode=Mode.SUBTRACT)
    add(cut_extrude5_tool4.solids().sort_by_distance((0.8, 2.9, 2.9))[0], mode=Mode.SUBTRACT)
    add(cut_extrude5_tool5.solids().sort_by_distance((0.8, 0, 17.5))[0], mode=Mode.SUBTRACT)
    add(cut_extrude5_tool6.solids().sort_by_distance((0.8, 0, -17.5))[0], mode=Mode.SUBTRACT)
    add(cut_extrude5_tool7.solids().sort_by_distance((0.8, 42.133323, 36.132914))[0], mode=Mode.SUBTRACT)
    add(cut_extrude5_tool8.solids().sort_by_distance((0.8, 39.489528, 39.908644))[0], mode=Mode.SUBTRACT)
    add(cut_extrude5_tool9.solids().sort_by_distance((0.8, 35.145733, 36.867086))[0], mode=Mode.SUBTRACT)
    add(cut_extrude5_tool10.solids().sort_by_distance((0.8, 37.789528, 31))[0], mode=Mode.SUBTRACT)
    add(cut_extrude5_tool11.solids().sort_by_distance((0.8, 39.489528, 31))[0], mode=Mode.SUBTRACT)
    add(cut_extrude5_tool12.solids().sort_by_distance((0.8, 5.336119, 0))[0], mode=Mode.SUBTRACT)

    # Sketch15 → Cut-Extrude6 (cut, up to next)
    with BuildSketch(Plane(origin=(0.8, 0, 0), x_dir=(0, 0, -1), z_dir=(1, 0, 0)), mode=Mode.PRIVATE) as cut_extrude6_sk1:
        with BuildLine():
            ThreePointArc((-19.517746342, 37.862958265), (-21.207853248, 46.065849373), (-26.609553808, 52.466280213))
            ThreePointArc((-26.609553808, 52.466280213), (-30.794941745, 51.771637991), (-30.100299523, 47.586250054))
            ThreePointArc((-30.100299523, 47.586250054), (-26.605081513, 43.444794805), (-25.511482927, 38.137041735))
            ThreePointArc((-25.511482927, 38.137041735), (-22.65165637, 35.003131707), (-19.517746342, 37.862958265))
        make_face()
    cut_extrude6_tool1 = extrude(cut_extrude6_sk1.sketch, amount=-CUT_EXTRUDE6_REACH, mode=Mode.PRIVATE) & part.part
    # Sketch15 → Cut-Extrude6 (cut, up to next)
    with BuildSketch(Plane(origin=(0.8, 0, 0), x_dir=(0, 0, -1), z_dir=(1, 0, 0)), mode=Mode.PRIVATE) as cut_extrude6_sk2:
        with BuildLine():
            ThreePointArc((-9.683842766, 46.695191395), (-14.07965784, 55.41237095), (-21.201157651, 62.090443276))
            ThreePointArc((-21.201157651, 62.090443276), (-25.352917386, 61.217006901), (-24.479481011, 57.065247166))
            ThreePointArc((-24.479481011, 57.065247166), (-18.884016874, 51.818190338), (-15.430162173, 44.968977831))
            ThreePointArc((-15.430162173, 44.968977831), (-11.693895687, 42.95892491), (-9.683842766, 46.695191395))
        make_face()
    cut_extrude6_tool2 = extrude(cut_extrude6_sk2.sketch, amount=-CUT_EXTRUDE6_REACH, mode=Mode.PRIVATE) & part.part
    add(cut_extrude6_tool1.solids().sort_by_distance((0.8, 44.381365, 24.676513))[0], mode=Mode.SUBTRACT)
    add(cut_extrude6_tool2.solids().sort_by_distance((0.8, 53.182243, 17.060681))[0], mode=Mode.SUBTRACT)


solid = part.part
